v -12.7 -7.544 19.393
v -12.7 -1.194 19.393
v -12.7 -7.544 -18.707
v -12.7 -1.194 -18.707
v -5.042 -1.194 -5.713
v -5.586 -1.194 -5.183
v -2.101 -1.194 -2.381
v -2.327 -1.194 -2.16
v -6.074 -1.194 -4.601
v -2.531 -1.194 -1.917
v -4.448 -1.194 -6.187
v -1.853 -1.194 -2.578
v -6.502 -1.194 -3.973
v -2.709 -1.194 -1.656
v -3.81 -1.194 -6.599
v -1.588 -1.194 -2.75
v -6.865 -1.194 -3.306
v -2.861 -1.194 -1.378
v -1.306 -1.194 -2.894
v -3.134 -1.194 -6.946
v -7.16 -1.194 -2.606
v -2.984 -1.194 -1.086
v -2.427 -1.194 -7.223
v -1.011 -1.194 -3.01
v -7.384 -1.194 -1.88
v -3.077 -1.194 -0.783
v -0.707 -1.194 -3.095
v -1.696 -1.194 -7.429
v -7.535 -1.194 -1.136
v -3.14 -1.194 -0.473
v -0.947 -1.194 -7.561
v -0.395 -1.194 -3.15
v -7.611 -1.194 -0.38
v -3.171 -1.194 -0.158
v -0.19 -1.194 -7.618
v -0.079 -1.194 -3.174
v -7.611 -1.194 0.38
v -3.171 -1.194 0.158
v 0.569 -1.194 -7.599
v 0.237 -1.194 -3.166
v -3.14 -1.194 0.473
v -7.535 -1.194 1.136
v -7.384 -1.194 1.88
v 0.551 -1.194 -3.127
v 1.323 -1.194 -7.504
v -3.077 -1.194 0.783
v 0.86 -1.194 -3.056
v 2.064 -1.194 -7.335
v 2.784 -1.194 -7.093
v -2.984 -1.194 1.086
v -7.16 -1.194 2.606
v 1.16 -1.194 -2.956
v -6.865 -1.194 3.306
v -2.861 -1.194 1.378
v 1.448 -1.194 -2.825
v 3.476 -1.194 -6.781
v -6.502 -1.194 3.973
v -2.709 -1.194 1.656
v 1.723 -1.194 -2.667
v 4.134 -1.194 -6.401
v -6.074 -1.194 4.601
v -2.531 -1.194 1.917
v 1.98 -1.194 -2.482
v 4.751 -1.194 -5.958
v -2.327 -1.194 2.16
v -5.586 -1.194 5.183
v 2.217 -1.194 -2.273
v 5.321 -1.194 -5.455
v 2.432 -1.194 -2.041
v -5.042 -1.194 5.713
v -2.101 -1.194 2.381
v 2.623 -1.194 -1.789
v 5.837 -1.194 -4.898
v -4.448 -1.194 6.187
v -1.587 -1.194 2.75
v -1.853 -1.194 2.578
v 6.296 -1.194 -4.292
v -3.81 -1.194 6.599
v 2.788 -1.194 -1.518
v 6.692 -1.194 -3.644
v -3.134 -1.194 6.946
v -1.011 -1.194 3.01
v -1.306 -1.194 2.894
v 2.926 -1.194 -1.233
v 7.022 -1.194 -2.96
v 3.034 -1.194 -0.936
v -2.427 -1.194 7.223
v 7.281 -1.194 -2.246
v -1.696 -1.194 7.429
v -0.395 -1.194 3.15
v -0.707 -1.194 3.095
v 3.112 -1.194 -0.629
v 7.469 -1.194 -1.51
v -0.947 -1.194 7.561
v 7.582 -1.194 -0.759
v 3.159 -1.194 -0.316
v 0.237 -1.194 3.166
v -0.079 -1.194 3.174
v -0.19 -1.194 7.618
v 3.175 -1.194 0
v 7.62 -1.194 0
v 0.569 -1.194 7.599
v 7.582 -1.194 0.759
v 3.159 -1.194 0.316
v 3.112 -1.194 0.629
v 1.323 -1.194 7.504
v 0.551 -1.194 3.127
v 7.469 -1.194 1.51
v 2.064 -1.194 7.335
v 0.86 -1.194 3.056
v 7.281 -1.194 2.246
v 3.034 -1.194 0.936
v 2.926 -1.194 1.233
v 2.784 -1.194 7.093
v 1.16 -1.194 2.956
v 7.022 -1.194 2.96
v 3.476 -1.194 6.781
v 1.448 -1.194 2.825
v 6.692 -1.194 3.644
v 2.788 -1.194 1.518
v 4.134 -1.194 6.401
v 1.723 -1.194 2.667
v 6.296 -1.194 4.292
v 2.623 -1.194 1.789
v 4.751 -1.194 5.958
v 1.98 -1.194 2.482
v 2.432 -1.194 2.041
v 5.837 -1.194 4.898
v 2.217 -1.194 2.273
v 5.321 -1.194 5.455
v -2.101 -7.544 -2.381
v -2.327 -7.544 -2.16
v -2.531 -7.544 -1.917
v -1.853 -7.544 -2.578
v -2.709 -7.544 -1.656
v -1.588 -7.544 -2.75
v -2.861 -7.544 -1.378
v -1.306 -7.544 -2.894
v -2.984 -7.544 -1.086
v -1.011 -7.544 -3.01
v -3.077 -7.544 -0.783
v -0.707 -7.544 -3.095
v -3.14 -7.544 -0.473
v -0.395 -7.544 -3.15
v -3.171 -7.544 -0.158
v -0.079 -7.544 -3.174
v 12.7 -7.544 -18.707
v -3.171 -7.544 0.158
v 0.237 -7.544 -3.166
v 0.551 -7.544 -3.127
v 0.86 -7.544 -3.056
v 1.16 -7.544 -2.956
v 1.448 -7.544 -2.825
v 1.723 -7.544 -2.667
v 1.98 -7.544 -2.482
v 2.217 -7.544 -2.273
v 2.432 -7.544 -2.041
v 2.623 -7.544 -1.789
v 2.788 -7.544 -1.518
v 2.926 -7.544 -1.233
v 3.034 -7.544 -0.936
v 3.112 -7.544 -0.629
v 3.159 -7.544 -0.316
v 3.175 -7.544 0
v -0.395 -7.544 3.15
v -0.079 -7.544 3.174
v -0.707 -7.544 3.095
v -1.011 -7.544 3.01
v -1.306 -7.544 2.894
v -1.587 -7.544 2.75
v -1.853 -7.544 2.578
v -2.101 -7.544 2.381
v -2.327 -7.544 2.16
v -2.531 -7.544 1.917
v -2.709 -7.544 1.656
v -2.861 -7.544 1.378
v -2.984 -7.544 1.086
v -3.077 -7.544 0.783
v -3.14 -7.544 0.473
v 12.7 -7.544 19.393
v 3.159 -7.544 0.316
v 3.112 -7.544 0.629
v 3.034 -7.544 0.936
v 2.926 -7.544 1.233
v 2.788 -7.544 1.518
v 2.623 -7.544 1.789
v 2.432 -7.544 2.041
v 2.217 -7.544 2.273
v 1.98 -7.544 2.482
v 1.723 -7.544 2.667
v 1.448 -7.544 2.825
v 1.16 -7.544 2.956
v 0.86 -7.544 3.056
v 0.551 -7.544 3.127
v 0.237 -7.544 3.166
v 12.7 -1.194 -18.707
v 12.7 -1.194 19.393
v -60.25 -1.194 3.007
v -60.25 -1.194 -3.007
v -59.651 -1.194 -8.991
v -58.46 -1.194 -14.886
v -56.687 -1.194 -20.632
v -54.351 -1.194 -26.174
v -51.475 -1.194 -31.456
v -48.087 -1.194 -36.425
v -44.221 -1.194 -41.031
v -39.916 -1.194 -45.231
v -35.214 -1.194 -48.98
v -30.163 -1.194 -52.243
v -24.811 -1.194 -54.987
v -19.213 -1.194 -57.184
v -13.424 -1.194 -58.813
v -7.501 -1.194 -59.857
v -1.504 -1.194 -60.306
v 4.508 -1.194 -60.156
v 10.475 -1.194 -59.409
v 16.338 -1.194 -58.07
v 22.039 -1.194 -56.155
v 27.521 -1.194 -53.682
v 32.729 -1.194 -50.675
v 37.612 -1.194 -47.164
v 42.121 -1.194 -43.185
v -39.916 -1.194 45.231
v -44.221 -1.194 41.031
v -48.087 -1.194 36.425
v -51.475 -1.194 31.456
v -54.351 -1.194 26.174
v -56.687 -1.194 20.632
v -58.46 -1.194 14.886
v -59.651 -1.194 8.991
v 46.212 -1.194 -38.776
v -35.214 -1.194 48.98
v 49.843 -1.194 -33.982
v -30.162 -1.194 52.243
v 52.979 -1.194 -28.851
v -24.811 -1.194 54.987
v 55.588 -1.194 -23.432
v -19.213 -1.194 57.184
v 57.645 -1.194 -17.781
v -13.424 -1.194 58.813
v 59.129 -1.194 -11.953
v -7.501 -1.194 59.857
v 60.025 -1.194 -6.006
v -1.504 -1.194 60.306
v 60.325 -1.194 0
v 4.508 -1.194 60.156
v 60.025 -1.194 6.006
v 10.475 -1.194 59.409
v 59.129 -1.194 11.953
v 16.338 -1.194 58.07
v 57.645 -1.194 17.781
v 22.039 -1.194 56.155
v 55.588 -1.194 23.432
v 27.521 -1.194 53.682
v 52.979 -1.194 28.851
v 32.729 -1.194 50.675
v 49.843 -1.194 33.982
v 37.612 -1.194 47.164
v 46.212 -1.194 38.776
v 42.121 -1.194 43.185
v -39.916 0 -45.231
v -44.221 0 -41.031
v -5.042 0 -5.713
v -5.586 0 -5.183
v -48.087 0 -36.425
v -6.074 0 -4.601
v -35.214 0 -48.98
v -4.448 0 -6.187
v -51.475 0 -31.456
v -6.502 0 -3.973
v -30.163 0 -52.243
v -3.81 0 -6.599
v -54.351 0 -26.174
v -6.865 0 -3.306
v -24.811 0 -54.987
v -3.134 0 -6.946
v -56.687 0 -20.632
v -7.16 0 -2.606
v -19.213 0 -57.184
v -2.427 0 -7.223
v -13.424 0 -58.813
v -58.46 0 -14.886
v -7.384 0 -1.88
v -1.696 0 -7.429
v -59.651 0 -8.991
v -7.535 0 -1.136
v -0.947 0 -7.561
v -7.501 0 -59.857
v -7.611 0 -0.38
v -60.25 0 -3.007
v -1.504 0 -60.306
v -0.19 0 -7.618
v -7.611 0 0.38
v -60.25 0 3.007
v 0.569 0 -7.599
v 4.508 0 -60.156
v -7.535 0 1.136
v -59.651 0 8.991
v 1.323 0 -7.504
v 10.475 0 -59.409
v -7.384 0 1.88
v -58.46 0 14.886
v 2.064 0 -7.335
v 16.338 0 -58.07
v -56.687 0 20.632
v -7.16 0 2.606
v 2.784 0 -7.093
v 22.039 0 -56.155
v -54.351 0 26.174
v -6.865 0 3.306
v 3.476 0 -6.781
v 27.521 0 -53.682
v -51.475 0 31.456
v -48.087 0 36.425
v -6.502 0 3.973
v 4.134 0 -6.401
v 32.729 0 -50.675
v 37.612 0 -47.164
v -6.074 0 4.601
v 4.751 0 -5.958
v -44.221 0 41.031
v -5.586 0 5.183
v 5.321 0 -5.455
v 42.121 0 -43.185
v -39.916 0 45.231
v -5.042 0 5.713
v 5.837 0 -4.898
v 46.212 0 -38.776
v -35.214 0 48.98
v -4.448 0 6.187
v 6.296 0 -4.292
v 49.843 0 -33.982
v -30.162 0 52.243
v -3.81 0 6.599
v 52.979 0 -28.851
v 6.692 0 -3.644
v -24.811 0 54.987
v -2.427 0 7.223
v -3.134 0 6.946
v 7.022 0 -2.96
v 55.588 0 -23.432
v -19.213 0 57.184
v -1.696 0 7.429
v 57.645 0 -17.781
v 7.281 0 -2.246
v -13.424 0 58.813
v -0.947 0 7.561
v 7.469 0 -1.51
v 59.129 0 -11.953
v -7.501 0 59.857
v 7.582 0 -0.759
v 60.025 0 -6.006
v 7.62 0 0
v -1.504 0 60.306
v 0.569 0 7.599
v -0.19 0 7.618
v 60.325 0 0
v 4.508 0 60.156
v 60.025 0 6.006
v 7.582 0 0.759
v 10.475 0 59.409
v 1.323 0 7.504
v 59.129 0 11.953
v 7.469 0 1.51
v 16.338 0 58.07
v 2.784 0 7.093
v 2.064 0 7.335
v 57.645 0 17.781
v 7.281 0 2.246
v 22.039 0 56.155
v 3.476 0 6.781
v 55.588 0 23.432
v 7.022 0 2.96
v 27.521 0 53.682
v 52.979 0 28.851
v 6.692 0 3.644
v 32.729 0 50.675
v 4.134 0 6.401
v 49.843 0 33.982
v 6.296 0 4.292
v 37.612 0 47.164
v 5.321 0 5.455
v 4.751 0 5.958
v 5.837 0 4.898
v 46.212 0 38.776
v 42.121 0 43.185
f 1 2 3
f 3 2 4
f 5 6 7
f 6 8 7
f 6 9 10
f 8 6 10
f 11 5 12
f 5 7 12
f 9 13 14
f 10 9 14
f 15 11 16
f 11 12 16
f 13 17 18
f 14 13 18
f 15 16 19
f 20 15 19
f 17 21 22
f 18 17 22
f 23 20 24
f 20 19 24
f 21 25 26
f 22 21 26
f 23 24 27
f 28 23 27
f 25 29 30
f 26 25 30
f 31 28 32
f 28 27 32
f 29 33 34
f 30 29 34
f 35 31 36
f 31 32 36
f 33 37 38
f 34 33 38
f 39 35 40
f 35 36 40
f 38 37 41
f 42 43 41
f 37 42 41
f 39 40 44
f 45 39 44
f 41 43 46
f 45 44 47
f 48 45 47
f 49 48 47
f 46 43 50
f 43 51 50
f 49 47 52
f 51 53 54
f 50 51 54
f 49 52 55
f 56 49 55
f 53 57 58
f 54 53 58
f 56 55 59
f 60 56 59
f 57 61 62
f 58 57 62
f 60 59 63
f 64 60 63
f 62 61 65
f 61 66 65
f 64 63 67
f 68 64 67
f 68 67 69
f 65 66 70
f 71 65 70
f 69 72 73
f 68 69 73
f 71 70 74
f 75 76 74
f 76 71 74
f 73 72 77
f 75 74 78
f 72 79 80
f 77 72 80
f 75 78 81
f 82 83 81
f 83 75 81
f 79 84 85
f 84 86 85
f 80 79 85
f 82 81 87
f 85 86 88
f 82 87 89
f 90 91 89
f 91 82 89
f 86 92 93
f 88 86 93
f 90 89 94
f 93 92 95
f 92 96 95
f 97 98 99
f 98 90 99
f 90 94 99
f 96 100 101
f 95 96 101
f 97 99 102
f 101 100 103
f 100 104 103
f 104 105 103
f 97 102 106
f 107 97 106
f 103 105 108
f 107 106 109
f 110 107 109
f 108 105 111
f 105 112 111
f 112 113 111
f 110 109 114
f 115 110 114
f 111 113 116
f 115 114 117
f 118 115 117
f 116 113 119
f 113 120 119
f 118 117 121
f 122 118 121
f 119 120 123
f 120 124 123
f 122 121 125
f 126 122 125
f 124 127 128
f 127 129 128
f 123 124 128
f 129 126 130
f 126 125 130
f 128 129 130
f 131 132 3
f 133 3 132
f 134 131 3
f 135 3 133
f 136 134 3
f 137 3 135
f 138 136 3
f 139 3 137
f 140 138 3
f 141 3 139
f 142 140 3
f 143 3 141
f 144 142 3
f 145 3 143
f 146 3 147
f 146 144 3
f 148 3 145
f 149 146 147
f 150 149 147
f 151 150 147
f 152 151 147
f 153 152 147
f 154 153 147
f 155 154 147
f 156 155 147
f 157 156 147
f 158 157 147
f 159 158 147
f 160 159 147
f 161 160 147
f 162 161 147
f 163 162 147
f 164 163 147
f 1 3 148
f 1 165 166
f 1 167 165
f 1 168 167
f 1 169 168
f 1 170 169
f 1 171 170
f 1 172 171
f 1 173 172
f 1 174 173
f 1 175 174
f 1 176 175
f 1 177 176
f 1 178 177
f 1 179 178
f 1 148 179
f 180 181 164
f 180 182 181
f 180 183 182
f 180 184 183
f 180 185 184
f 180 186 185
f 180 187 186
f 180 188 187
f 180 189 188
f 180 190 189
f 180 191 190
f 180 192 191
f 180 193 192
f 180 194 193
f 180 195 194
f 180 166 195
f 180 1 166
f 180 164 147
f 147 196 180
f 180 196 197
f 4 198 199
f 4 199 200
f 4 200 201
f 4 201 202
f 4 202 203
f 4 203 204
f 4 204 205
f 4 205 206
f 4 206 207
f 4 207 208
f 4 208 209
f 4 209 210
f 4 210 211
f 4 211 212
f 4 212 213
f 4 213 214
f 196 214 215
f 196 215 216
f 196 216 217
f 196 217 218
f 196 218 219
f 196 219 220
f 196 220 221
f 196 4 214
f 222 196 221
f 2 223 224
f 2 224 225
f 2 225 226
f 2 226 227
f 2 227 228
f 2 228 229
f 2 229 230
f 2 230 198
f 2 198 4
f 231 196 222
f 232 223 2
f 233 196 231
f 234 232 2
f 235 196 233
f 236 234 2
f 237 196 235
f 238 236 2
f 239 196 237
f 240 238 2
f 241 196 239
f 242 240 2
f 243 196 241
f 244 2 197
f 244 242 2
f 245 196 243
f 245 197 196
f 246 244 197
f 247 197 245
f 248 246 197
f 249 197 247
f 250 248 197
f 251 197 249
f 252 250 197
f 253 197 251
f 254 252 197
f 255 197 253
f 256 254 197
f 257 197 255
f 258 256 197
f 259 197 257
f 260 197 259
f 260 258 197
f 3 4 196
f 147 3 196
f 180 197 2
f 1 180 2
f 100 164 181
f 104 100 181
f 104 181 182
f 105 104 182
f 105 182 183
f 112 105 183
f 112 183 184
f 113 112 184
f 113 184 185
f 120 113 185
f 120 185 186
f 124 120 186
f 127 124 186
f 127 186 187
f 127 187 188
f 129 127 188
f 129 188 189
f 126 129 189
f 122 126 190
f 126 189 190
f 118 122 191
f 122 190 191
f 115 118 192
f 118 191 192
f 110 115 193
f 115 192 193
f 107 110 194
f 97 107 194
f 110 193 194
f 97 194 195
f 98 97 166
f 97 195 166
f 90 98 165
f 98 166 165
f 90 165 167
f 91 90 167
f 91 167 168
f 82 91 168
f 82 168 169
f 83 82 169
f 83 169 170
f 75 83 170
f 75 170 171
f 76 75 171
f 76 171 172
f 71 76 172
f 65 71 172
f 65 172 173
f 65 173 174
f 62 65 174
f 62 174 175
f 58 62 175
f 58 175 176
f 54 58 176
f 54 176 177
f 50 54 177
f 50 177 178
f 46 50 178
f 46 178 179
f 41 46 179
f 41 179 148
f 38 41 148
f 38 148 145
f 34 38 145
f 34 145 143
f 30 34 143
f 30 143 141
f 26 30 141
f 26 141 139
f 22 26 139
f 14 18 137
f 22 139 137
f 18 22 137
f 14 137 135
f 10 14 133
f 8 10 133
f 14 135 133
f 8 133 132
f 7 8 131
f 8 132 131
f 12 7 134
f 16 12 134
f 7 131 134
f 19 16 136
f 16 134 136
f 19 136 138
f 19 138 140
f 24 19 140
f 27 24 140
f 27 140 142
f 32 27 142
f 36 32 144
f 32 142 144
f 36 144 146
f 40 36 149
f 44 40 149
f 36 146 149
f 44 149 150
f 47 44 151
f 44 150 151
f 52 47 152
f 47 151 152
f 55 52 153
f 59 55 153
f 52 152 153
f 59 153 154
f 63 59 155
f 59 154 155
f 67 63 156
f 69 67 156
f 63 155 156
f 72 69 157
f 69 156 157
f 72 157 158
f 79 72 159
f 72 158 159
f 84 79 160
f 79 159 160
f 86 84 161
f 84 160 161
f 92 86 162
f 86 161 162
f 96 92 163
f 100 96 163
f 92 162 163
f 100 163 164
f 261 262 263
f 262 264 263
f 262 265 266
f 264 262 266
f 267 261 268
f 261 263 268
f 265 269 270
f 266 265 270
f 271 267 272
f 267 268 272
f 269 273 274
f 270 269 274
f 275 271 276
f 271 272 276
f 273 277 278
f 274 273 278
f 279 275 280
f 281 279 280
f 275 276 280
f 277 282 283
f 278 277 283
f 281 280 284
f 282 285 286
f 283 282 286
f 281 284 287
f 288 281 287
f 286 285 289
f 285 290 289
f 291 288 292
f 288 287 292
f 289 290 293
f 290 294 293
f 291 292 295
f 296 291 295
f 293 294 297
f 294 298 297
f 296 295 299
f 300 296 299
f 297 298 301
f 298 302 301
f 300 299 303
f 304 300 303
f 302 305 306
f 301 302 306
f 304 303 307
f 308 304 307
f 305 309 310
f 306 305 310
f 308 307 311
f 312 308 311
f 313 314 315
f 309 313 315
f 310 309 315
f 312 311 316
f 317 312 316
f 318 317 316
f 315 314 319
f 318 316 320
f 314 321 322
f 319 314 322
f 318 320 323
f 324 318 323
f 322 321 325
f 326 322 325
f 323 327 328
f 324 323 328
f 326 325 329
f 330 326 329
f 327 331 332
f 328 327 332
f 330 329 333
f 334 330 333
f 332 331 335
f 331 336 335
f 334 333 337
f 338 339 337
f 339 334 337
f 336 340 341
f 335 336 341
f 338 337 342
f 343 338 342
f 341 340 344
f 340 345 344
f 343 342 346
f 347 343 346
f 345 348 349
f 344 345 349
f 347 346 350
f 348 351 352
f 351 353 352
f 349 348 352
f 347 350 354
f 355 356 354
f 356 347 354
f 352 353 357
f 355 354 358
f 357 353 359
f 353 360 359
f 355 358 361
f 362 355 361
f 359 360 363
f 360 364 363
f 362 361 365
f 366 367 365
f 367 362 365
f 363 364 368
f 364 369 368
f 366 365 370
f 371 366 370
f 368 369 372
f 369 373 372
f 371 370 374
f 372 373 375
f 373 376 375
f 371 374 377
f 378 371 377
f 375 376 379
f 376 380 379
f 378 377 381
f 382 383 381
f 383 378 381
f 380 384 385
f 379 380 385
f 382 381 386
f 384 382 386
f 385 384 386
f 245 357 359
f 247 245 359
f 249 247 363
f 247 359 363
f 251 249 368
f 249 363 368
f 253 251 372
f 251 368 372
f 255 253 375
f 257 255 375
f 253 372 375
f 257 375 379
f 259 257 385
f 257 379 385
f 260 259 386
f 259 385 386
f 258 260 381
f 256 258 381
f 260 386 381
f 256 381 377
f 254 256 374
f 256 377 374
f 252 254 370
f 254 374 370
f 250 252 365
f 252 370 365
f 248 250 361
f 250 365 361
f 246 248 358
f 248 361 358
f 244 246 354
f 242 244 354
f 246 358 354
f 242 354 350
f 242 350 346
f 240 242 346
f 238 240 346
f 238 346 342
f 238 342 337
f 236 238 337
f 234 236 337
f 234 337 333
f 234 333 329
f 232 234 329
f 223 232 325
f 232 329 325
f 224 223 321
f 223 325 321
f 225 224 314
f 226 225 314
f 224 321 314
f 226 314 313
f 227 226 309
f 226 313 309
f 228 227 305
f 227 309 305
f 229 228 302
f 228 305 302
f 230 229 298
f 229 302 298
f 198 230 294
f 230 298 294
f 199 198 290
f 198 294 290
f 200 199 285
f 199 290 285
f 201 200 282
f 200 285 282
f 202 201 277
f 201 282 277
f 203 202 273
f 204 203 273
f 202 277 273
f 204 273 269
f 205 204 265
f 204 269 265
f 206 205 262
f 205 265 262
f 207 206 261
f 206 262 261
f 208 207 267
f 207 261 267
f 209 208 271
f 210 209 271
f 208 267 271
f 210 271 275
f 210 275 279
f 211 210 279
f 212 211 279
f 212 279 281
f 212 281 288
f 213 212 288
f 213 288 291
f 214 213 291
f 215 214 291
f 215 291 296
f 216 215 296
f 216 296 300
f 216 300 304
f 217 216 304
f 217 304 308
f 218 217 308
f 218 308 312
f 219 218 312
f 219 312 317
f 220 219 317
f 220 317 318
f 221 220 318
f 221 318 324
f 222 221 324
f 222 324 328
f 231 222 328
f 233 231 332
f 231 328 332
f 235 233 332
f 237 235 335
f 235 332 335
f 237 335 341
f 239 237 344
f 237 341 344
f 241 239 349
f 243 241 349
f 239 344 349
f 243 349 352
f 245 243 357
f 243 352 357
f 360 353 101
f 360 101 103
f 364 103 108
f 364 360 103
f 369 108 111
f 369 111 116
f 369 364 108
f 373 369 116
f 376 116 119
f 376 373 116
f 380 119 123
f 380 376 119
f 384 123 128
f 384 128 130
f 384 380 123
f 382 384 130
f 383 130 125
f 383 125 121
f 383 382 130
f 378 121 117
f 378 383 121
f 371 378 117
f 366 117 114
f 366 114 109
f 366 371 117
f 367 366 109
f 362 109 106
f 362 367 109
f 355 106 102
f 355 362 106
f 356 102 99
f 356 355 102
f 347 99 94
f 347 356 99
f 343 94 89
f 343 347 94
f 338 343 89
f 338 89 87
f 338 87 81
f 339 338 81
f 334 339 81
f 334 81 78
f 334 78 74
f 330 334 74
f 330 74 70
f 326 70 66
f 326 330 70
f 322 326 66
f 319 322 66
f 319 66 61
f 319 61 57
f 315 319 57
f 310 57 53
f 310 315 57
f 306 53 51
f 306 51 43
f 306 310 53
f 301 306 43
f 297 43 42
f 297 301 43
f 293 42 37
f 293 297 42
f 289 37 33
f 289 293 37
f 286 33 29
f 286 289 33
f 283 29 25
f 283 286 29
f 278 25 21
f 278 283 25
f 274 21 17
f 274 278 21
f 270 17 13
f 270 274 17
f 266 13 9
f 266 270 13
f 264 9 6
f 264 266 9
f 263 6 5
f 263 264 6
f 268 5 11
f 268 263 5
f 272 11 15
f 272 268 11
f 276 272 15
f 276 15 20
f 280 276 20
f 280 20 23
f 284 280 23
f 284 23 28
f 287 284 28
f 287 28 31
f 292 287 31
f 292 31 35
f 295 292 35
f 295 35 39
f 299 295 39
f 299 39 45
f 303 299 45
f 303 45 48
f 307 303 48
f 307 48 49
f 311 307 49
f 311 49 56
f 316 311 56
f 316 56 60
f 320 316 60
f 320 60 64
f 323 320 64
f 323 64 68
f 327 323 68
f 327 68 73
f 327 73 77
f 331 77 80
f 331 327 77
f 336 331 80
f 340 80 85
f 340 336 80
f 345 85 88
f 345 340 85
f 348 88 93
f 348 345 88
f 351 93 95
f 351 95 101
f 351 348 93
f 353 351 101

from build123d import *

# Parameters (mm, degrees)
F0_R     = 60.325
F0_R_2   = 7.62
F1_DEPTH = 1.1938
F2_R     = 7.62
F3_DEPTH = 6.35
F4_R     = 3.175
F5_DEPTH = 25.4


with BuildPart() as f1:
    # F0 (on Front) → F1 (new body)
    with BuildSketch(Plane.XZ):
        Circle(F0_R)
        Circle(F0_R_2, mode=Mode.SUBTRACT)
    extrude(amount=F1_DEPTH)

    # F2 (on face) → F3 (join)
    with BuildSketch(Plane.XZ.offset(1.1938)):
        Polygon((12.7, 19.392626), (0, 19.392626), (-12.7, 19.392626), (-12.7, -18.707374), (12.7, -18.707374), align=None)
        Circle(F2_R, mode=Mode.SUBTRACT)
        Circle(F2_R)
    extrude(amount=F3_DEPTH)

    # F4 (on face) → F5 (cut)
    with BuildSketch(Plane.XZ.offset(7.5438)):
        Circle(F4_R)
    extrude(amount=-F5_DEPTH, mode=Mode.SUBTRACT)


solid = f1.part
